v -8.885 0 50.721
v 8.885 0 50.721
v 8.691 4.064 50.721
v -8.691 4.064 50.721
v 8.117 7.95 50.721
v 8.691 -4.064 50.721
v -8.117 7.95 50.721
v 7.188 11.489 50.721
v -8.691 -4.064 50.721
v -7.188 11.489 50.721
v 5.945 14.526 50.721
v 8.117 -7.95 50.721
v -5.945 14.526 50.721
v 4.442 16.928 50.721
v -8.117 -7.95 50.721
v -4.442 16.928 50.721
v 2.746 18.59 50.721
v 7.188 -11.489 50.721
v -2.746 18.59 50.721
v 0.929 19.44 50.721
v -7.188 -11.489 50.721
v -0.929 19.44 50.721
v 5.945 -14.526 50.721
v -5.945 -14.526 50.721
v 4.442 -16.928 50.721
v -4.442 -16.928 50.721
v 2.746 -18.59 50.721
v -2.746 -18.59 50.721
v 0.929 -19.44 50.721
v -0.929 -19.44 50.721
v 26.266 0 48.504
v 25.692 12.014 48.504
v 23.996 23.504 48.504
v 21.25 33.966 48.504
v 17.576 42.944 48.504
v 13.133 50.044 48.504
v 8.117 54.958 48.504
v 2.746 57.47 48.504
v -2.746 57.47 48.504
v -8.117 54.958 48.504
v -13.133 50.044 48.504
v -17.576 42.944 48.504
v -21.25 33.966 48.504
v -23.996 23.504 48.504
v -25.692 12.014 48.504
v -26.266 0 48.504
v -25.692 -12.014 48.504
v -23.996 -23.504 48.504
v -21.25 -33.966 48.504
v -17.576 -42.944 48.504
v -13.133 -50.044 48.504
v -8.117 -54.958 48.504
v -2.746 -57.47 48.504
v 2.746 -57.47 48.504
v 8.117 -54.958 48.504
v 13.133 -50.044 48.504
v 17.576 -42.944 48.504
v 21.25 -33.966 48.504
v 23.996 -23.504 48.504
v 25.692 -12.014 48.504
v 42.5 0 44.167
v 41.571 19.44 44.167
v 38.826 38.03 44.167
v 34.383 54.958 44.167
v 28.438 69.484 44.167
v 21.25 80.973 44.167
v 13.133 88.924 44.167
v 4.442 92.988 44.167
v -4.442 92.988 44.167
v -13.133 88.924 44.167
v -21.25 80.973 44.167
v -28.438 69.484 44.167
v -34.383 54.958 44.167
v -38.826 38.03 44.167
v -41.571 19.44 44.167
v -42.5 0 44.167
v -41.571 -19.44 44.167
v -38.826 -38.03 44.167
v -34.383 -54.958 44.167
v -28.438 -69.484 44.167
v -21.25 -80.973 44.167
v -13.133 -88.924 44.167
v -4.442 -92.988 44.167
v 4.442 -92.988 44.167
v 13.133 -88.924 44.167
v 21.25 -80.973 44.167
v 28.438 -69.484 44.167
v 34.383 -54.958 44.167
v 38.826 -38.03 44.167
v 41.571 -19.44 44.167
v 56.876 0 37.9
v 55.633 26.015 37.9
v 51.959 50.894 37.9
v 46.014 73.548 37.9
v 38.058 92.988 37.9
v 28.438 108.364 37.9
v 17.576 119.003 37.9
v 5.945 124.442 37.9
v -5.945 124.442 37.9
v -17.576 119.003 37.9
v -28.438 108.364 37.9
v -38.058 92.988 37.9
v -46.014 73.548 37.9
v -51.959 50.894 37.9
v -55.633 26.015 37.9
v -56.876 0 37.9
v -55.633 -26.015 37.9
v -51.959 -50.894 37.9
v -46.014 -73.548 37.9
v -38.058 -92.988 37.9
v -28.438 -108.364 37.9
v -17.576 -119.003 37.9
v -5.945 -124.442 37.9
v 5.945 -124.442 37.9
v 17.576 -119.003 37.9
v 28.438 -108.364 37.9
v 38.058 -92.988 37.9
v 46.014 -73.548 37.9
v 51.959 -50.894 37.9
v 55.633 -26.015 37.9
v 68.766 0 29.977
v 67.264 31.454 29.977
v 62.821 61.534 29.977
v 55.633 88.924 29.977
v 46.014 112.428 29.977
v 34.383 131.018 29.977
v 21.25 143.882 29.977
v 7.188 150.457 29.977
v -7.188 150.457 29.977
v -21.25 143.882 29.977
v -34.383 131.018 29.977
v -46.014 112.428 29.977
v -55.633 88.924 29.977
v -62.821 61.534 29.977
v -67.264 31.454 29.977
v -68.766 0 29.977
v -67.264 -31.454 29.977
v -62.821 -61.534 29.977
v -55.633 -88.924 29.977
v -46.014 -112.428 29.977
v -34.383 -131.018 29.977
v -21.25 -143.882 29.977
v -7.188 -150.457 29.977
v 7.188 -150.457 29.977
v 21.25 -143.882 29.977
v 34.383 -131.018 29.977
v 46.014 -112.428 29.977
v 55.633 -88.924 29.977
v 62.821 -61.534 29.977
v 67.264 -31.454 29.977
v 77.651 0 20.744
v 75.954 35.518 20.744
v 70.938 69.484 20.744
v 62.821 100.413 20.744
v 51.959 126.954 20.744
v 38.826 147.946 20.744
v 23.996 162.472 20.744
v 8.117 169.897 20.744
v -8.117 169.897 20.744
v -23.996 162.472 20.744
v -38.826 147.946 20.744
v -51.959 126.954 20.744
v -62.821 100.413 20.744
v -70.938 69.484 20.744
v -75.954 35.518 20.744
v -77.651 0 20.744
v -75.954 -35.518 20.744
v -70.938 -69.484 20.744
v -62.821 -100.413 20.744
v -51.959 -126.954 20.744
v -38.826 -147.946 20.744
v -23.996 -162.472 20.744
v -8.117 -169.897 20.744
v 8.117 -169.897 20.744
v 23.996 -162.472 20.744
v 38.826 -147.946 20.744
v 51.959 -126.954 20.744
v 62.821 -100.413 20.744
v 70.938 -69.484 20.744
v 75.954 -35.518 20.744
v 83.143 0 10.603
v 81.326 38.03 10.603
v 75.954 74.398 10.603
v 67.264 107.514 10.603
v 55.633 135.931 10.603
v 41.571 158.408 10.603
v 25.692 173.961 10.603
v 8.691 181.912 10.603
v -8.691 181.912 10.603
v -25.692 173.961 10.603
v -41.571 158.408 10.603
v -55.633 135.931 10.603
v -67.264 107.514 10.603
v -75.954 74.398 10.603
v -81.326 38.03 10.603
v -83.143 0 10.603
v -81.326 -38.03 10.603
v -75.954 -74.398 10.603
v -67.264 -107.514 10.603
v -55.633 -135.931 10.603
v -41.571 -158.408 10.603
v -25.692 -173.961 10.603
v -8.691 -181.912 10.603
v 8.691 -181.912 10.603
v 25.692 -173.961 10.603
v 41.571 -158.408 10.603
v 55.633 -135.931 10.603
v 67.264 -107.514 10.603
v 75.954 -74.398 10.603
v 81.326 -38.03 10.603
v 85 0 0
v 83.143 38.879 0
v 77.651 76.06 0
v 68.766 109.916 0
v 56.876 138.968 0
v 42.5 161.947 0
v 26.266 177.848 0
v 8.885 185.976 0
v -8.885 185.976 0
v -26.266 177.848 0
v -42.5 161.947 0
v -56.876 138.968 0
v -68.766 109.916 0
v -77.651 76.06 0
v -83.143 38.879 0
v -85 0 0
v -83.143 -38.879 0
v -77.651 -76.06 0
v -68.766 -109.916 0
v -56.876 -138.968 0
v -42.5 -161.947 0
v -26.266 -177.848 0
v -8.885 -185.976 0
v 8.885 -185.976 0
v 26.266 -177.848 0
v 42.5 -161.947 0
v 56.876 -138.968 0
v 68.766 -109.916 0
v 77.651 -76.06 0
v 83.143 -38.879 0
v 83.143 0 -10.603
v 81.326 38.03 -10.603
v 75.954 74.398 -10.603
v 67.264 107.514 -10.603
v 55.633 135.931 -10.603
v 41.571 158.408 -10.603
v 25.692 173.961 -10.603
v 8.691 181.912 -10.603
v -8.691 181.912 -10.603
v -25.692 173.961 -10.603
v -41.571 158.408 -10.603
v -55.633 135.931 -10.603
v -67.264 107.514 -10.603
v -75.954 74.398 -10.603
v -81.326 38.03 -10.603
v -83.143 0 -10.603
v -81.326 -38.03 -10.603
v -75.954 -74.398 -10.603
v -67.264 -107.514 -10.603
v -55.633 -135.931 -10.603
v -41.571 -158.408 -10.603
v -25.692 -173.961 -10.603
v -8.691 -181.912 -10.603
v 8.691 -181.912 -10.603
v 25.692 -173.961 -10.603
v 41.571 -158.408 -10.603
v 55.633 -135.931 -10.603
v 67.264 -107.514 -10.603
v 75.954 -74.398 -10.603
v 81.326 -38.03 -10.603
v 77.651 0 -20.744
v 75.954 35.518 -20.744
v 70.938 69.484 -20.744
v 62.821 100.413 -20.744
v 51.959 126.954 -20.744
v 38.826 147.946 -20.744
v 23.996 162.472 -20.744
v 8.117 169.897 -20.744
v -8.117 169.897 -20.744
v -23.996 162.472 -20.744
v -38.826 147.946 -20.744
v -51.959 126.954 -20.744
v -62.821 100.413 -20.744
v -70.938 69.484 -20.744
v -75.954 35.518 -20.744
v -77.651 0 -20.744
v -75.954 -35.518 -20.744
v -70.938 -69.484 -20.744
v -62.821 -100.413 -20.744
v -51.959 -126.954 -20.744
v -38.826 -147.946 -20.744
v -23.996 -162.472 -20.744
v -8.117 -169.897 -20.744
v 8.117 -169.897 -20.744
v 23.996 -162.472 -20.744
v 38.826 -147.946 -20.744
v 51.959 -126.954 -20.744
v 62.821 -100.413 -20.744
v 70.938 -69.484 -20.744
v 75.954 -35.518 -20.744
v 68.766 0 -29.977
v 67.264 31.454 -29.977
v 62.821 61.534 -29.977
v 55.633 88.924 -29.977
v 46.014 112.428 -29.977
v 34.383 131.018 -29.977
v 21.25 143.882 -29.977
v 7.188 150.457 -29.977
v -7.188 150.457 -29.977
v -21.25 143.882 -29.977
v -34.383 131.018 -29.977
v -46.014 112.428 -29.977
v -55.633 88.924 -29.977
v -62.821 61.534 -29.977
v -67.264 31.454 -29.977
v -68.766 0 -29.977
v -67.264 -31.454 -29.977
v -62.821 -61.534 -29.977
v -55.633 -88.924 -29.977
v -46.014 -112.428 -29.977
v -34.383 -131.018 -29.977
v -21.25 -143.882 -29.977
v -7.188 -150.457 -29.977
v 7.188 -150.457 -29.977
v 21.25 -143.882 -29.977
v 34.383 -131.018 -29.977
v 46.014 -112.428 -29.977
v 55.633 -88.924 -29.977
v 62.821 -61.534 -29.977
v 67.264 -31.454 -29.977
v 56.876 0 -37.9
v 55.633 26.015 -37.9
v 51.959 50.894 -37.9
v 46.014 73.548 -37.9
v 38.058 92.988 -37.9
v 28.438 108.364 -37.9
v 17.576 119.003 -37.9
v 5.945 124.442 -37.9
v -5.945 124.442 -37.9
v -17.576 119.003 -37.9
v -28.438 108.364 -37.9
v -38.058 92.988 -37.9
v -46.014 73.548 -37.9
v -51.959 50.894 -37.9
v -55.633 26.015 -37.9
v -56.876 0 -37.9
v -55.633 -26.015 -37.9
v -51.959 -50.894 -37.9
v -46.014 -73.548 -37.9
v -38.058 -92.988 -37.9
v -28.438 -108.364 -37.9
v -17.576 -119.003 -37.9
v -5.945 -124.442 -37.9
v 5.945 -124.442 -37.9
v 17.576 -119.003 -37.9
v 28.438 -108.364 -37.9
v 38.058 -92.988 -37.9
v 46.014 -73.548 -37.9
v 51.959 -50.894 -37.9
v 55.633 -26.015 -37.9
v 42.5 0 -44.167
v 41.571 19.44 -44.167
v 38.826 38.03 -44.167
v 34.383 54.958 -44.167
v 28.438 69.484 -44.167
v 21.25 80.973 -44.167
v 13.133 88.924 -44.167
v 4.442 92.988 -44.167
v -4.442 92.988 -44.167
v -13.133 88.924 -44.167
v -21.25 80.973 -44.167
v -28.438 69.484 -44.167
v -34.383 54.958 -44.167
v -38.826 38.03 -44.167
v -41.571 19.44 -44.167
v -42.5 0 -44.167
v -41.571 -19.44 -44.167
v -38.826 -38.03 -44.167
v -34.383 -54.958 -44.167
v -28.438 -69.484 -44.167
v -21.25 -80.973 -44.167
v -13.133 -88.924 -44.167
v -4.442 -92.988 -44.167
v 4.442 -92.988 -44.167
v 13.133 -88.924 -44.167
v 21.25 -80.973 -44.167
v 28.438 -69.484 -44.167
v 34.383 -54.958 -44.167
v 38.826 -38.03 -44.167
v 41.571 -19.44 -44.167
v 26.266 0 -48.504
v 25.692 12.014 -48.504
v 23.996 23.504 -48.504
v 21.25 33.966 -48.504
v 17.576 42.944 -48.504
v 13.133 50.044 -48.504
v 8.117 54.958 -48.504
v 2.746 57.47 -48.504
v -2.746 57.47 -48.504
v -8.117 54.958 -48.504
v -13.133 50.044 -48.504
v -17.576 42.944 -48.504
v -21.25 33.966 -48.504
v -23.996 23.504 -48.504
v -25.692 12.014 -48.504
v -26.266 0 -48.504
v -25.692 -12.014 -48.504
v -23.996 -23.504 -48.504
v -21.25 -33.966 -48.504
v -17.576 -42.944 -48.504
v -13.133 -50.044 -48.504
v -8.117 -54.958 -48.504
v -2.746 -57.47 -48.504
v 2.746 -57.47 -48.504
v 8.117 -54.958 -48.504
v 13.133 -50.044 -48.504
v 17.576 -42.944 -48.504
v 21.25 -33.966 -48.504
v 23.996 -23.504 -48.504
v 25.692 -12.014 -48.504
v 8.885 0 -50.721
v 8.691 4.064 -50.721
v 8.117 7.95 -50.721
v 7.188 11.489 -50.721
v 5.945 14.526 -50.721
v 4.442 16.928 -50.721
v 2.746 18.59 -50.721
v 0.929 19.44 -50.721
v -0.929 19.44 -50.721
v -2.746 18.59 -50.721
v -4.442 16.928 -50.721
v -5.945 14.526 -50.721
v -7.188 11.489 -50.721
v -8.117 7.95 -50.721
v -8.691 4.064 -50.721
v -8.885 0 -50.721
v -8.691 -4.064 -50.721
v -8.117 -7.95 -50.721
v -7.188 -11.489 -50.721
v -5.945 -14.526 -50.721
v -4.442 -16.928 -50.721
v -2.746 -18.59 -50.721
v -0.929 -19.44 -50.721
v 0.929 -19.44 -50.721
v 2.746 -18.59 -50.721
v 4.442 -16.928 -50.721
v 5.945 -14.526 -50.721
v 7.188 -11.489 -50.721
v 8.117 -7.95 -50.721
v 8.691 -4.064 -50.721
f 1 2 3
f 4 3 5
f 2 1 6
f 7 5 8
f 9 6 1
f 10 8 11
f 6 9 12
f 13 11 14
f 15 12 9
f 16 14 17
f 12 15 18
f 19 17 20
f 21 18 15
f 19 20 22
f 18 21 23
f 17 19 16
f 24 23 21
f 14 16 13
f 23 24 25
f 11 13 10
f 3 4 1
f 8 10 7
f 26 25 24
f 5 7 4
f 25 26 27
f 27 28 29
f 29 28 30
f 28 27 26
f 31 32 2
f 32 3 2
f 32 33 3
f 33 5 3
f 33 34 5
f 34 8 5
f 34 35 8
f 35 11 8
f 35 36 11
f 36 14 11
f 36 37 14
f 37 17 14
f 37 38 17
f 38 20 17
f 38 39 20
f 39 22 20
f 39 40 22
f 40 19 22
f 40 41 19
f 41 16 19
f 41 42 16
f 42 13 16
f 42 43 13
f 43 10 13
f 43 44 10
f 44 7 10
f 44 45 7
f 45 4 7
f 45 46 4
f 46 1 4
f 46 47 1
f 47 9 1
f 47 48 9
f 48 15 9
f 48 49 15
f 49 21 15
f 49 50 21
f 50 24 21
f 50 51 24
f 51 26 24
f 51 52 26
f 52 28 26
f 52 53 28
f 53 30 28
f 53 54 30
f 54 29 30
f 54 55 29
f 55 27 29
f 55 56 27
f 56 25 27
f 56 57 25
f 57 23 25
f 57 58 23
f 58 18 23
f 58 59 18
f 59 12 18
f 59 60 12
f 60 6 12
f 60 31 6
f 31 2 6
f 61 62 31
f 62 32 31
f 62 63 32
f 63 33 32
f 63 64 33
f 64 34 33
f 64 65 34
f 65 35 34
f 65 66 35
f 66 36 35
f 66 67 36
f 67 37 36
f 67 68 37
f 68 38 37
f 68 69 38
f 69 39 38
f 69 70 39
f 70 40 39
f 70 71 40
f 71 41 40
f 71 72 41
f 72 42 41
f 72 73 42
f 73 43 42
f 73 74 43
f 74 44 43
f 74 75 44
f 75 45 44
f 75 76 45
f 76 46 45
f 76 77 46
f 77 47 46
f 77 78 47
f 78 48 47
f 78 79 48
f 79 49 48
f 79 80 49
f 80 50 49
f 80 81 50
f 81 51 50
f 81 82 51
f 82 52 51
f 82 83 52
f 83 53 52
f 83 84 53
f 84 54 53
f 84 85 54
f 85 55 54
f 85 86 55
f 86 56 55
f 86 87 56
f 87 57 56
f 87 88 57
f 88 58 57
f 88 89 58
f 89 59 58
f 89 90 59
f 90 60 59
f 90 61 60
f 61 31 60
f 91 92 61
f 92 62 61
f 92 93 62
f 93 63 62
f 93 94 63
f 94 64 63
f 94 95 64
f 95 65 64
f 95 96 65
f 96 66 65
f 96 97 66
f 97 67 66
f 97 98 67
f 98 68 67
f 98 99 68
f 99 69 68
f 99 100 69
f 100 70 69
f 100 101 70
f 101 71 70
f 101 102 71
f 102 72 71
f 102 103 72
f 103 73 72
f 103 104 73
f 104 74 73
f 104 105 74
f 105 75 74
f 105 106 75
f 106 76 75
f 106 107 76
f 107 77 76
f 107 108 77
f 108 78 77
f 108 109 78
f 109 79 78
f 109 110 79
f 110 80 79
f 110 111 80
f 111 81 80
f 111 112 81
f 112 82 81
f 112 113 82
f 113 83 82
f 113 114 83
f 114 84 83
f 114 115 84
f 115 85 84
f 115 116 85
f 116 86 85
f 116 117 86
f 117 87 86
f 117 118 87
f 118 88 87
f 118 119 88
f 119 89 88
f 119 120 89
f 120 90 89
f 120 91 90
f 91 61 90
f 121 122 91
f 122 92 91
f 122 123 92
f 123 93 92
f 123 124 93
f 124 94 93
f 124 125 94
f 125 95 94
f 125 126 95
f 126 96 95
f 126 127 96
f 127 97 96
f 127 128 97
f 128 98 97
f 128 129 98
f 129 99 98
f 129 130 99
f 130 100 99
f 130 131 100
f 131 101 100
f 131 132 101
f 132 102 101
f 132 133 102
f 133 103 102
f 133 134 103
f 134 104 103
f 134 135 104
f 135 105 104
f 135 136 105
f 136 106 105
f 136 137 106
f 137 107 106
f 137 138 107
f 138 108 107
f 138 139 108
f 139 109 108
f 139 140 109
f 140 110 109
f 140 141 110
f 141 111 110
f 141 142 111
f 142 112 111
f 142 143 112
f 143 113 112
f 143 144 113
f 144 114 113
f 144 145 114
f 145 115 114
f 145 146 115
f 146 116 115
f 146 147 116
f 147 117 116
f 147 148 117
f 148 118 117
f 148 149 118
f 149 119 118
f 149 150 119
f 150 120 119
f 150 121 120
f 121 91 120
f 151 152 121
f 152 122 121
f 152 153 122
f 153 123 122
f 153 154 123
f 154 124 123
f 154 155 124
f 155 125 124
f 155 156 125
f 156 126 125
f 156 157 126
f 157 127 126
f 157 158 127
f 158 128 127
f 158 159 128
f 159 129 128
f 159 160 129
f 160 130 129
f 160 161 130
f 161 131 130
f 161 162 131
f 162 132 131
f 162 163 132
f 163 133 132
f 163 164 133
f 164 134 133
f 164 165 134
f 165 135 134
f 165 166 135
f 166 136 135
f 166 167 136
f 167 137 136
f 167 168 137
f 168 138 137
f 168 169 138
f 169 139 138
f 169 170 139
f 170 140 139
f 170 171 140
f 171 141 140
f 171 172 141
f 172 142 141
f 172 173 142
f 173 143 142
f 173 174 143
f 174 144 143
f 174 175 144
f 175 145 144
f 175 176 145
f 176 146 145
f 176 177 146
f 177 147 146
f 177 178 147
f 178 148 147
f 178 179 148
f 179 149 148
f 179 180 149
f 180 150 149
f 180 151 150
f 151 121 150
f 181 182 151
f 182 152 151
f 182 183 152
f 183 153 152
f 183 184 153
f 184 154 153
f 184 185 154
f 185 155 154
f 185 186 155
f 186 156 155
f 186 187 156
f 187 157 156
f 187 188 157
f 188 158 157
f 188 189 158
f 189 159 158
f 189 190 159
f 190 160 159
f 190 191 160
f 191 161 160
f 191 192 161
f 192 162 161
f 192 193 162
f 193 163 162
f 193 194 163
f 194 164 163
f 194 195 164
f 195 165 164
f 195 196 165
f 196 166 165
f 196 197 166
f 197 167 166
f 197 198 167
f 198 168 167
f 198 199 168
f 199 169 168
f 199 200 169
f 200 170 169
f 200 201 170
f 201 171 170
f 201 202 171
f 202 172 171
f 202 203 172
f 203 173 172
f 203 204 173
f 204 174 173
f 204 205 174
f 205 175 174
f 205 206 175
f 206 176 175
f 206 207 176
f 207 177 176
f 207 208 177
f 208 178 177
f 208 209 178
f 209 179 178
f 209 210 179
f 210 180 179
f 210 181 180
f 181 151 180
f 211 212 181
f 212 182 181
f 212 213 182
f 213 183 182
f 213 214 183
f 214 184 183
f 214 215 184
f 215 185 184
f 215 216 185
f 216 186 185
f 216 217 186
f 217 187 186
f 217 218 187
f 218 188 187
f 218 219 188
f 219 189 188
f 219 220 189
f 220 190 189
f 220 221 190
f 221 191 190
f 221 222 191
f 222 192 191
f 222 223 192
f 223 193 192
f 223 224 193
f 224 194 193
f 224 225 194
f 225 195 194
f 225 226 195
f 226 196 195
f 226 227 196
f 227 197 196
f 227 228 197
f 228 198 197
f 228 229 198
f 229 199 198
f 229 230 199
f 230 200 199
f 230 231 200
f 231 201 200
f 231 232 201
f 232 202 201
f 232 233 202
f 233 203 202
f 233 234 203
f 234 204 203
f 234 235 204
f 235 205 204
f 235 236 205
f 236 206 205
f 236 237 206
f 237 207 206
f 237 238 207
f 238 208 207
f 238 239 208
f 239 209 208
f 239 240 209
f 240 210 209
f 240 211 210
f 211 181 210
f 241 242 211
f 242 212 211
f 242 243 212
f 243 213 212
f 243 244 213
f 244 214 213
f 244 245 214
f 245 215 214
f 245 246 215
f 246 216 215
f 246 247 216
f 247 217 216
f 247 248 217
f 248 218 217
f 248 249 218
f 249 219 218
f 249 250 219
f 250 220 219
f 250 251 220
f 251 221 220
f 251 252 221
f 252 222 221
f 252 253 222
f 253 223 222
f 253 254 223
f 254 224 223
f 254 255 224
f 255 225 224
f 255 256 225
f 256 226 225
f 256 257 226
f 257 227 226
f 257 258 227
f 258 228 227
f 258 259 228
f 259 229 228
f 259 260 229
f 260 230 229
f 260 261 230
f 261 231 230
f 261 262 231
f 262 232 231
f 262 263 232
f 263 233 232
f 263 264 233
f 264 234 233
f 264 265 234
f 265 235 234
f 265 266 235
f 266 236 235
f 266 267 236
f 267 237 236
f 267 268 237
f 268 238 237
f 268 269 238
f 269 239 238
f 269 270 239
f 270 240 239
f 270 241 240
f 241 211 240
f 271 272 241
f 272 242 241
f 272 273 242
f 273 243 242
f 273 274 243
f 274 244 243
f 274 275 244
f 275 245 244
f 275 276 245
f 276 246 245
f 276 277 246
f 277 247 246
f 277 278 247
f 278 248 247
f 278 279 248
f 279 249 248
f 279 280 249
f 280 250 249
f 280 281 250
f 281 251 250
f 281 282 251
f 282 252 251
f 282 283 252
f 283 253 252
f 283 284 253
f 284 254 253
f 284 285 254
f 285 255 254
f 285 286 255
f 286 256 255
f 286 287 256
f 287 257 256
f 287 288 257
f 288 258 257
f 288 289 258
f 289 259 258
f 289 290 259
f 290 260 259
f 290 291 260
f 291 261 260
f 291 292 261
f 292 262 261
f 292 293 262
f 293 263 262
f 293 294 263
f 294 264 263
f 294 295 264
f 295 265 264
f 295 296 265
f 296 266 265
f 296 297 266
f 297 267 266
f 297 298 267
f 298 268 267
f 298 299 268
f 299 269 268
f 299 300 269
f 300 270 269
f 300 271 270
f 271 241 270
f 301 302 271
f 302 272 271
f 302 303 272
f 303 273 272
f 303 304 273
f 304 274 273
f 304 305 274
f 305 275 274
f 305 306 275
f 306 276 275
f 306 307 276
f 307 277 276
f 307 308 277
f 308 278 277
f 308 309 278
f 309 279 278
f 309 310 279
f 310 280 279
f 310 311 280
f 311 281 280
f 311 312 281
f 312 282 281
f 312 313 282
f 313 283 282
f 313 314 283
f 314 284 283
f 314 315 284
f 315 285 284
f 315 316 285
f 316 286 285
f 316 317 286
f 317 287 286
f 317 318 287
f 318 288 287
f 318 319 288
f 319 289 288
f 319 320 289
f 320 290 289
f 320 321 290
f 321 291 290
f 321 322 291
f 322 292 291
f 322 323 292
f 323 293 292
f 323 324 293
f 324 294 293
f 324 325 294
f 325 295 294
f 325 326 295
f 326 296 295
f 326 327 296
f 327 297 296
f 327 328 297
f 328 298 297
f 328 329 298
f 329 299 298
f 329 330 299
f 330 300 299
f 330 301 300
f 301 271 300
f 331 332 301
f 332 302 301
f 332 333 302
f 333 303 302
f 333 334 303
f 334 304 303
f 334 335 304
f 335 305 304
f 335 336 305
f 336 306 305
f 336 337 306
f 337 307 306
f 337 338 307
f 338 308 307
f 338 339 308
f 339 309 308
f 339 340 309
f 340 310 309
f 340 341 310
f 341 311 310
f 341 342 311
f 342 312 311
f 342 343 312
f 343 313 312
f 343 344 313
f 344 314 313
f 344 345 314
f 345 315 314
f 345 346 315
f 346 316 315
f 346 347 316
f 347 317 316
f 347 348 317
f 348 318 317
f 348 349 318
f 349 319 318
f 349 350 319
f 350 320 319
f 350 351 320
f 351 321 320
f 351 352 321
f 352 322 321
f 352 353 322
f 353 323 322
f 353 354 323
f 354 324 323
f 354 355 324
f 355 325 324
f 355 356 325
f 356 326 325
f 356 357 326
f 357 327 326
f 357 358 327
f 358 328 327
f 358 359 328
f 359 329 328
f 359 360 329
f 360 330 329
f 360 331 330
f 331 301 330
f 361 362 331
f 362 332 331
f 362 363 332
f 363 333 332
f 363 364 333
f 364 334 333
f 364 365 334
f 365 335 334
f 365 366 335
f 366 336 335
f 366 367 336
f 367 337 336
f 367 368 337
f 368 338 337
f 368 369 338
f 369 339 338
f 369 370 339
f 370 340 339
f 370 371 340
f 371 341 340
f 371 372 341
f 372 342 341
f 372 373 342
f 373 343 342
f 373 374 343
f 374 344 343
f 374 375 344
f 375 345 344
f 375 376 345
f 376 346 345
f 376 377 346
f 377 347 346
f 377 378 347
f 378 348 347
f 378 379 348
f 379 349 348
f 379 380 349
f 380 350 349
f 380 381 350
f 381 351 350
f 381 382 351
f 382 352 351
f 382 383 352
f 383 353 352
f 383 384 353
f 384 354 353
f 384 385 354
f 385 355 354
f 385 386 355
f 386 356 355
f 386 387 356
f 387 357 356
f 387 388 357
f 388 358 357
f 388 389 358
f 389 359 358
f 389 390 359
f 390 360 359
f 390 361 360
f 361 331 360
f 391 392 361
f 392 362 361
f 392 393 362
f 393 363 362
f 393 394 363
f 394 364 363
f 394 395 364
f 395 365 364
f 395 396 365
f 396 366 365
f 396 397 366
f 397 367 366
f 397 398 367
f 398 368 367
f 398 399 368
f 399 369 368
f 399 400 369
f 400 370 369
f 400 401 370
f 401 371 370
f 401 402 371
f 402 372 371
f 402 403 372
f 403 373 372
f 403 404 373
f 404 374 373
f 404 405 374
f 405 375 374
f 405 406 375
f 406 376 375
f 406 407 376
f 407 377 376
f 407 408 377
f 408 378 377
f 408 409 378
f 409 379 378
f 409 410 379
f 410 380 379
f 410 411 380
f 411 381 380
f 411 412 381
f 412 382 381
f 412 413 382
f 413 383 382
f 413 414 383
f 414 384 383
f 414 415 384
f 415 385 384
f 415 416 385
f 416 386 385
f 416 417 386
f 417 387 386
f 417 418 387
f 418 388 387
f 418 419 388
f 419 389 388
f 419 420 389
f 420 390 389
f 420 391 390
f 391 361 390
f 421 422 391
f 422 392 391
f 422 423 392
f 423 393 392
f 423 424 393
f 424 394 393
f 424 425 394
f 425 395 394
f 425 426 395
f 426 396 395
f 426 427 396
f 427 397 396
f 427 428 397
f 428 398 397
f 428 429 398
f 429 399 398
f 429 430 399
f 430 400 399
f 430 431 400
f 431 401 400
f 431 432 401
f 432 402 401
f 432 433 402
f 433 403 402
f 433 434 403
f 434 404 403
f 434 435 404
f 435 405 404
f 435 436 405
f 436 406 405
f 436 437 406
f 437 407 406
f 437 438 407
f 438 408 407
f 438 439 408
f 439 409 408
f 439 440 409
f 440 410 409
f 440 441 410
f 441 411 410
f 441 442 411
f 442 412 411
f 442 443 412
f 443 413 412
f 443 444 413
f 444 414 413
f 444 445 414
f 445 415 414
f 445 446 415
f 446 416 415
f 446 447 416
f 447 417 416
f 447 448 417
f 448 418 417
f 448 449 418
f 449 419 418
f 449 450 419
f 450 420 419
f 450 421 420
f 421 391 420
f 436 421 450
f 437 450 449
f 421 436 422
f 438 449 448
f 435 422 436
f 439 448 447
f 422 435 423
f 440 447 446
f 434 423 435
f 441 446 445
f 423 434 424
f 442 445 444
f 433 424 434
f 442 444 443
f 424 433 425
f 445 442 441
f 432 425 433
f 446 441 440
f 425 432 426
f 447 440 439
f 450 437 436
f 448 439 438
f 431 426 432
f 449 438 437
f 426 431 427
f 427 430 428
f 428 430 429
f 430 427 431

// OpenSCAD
// Generated by SolidPython 1.0.1 on 2020-07-29 00:46:46


scale(v = [5, 11, 3]) {
	sphere(r = 17);
}
/***********************************************
*********      SolidPython code:      **********
************************************************
 
# import packages: SolidPython
from solid import *
from solid.utils import *
from itertools import chain, combinations, permutations


class Resize:

    def __init__(self, scad_file):
        self.scad_file = scad_file
        #self.scad_file = import_scad(scad_file)
        # cone/cylinder param:
        self.r1 = 0
        self.r2 = 0
        self.h = 0
        # rectangular prism param:
        self.w = 0
        self.l = 0
        # ellipse param:
        self.r = 0

    # import OpenScad code (file name corresponds to shape)


    # classify shape + parameters
    def assign(self, param1, param2, param3):
        if self.scad_file == 'cone.scad':
            self.r1 = param1
            self.r2 = param2
            self.h = param3
        elif self.scad_file == 'cylinder.scad':
            self.r1 = param1
            self.r2 = param2
            self.h = param3
        elif self.scad_file == 'rectangularPrism.scad':
            self.h = param1
            self.l = param2
            self.w = param3
        else:
            self.r = param1
            self.h = param2

    # resize parameters
    def iterate(self):
        x = range(3, 20, 2)
        i = 1
        if self.scad_file == 'cone.scad':
            tempList = list(permutations(x, 2))
            for temp in tempList:
                param1 = temp[0]
                param2 = temp[1]
                filepath = 'produced_scad_files/' + 'cone' + str(param1) + '_' + str(param2) + '_' + '.scad'
                scad_render_to_file(cylinder(h=param1, r1=param2, r2=0), filepath)

        elif self.scad_file == 'cylinder.scad':
            tempList = list(permutations(x, 3))
            for temp in tempList:
                param1 = temp[0]
                param2 = temp[1]
                filepath = 'produced_scad_files/' + 'cylinder' + str(param1) + '_' + str(param2) + '_' + '.scad'
                scad_render_to_file(cylinder(h=param1, r1=param2, r2=param2), filepath)

        elif self.scad_file == 'rectangularPrism.scad':
            tempList = list(permutations(x, 3))
            for temp in tempList:
                param1 = temp[0]
                param2 = temp[1]
                param3 = temp[2]
                filepath = 'produced_scad_files/' + 'rectangularPrism' + str(param1) + '_' + str(param2) + '_' + str(
                    param3) + '.scad'
                scad_render_to_file(cube(size=(param1, param2, param3)), filepath)

        elif self.scad_file == 'ellipse.scad':
            tempList = list(permutations(x, 4))
            for temp in tempList:
                param1 = temp[0]
                param2 = temp[1]
                param3 = temp[2]
                param4 = temp[3]
                filepath = 'produced_scad_files/' + 'ellipse' + str(param1) + '_' + str(param2) + '_' + str(param3) + '_' + str(param4) + '.scad'
                scad_render_to_file(scale([param1, param2, param3])(sphere(r=param4)), filepath)

    def render_to_scadfile(self):
        scad_render_to_file(scad, 'example.scad') 
 
************************************************/
